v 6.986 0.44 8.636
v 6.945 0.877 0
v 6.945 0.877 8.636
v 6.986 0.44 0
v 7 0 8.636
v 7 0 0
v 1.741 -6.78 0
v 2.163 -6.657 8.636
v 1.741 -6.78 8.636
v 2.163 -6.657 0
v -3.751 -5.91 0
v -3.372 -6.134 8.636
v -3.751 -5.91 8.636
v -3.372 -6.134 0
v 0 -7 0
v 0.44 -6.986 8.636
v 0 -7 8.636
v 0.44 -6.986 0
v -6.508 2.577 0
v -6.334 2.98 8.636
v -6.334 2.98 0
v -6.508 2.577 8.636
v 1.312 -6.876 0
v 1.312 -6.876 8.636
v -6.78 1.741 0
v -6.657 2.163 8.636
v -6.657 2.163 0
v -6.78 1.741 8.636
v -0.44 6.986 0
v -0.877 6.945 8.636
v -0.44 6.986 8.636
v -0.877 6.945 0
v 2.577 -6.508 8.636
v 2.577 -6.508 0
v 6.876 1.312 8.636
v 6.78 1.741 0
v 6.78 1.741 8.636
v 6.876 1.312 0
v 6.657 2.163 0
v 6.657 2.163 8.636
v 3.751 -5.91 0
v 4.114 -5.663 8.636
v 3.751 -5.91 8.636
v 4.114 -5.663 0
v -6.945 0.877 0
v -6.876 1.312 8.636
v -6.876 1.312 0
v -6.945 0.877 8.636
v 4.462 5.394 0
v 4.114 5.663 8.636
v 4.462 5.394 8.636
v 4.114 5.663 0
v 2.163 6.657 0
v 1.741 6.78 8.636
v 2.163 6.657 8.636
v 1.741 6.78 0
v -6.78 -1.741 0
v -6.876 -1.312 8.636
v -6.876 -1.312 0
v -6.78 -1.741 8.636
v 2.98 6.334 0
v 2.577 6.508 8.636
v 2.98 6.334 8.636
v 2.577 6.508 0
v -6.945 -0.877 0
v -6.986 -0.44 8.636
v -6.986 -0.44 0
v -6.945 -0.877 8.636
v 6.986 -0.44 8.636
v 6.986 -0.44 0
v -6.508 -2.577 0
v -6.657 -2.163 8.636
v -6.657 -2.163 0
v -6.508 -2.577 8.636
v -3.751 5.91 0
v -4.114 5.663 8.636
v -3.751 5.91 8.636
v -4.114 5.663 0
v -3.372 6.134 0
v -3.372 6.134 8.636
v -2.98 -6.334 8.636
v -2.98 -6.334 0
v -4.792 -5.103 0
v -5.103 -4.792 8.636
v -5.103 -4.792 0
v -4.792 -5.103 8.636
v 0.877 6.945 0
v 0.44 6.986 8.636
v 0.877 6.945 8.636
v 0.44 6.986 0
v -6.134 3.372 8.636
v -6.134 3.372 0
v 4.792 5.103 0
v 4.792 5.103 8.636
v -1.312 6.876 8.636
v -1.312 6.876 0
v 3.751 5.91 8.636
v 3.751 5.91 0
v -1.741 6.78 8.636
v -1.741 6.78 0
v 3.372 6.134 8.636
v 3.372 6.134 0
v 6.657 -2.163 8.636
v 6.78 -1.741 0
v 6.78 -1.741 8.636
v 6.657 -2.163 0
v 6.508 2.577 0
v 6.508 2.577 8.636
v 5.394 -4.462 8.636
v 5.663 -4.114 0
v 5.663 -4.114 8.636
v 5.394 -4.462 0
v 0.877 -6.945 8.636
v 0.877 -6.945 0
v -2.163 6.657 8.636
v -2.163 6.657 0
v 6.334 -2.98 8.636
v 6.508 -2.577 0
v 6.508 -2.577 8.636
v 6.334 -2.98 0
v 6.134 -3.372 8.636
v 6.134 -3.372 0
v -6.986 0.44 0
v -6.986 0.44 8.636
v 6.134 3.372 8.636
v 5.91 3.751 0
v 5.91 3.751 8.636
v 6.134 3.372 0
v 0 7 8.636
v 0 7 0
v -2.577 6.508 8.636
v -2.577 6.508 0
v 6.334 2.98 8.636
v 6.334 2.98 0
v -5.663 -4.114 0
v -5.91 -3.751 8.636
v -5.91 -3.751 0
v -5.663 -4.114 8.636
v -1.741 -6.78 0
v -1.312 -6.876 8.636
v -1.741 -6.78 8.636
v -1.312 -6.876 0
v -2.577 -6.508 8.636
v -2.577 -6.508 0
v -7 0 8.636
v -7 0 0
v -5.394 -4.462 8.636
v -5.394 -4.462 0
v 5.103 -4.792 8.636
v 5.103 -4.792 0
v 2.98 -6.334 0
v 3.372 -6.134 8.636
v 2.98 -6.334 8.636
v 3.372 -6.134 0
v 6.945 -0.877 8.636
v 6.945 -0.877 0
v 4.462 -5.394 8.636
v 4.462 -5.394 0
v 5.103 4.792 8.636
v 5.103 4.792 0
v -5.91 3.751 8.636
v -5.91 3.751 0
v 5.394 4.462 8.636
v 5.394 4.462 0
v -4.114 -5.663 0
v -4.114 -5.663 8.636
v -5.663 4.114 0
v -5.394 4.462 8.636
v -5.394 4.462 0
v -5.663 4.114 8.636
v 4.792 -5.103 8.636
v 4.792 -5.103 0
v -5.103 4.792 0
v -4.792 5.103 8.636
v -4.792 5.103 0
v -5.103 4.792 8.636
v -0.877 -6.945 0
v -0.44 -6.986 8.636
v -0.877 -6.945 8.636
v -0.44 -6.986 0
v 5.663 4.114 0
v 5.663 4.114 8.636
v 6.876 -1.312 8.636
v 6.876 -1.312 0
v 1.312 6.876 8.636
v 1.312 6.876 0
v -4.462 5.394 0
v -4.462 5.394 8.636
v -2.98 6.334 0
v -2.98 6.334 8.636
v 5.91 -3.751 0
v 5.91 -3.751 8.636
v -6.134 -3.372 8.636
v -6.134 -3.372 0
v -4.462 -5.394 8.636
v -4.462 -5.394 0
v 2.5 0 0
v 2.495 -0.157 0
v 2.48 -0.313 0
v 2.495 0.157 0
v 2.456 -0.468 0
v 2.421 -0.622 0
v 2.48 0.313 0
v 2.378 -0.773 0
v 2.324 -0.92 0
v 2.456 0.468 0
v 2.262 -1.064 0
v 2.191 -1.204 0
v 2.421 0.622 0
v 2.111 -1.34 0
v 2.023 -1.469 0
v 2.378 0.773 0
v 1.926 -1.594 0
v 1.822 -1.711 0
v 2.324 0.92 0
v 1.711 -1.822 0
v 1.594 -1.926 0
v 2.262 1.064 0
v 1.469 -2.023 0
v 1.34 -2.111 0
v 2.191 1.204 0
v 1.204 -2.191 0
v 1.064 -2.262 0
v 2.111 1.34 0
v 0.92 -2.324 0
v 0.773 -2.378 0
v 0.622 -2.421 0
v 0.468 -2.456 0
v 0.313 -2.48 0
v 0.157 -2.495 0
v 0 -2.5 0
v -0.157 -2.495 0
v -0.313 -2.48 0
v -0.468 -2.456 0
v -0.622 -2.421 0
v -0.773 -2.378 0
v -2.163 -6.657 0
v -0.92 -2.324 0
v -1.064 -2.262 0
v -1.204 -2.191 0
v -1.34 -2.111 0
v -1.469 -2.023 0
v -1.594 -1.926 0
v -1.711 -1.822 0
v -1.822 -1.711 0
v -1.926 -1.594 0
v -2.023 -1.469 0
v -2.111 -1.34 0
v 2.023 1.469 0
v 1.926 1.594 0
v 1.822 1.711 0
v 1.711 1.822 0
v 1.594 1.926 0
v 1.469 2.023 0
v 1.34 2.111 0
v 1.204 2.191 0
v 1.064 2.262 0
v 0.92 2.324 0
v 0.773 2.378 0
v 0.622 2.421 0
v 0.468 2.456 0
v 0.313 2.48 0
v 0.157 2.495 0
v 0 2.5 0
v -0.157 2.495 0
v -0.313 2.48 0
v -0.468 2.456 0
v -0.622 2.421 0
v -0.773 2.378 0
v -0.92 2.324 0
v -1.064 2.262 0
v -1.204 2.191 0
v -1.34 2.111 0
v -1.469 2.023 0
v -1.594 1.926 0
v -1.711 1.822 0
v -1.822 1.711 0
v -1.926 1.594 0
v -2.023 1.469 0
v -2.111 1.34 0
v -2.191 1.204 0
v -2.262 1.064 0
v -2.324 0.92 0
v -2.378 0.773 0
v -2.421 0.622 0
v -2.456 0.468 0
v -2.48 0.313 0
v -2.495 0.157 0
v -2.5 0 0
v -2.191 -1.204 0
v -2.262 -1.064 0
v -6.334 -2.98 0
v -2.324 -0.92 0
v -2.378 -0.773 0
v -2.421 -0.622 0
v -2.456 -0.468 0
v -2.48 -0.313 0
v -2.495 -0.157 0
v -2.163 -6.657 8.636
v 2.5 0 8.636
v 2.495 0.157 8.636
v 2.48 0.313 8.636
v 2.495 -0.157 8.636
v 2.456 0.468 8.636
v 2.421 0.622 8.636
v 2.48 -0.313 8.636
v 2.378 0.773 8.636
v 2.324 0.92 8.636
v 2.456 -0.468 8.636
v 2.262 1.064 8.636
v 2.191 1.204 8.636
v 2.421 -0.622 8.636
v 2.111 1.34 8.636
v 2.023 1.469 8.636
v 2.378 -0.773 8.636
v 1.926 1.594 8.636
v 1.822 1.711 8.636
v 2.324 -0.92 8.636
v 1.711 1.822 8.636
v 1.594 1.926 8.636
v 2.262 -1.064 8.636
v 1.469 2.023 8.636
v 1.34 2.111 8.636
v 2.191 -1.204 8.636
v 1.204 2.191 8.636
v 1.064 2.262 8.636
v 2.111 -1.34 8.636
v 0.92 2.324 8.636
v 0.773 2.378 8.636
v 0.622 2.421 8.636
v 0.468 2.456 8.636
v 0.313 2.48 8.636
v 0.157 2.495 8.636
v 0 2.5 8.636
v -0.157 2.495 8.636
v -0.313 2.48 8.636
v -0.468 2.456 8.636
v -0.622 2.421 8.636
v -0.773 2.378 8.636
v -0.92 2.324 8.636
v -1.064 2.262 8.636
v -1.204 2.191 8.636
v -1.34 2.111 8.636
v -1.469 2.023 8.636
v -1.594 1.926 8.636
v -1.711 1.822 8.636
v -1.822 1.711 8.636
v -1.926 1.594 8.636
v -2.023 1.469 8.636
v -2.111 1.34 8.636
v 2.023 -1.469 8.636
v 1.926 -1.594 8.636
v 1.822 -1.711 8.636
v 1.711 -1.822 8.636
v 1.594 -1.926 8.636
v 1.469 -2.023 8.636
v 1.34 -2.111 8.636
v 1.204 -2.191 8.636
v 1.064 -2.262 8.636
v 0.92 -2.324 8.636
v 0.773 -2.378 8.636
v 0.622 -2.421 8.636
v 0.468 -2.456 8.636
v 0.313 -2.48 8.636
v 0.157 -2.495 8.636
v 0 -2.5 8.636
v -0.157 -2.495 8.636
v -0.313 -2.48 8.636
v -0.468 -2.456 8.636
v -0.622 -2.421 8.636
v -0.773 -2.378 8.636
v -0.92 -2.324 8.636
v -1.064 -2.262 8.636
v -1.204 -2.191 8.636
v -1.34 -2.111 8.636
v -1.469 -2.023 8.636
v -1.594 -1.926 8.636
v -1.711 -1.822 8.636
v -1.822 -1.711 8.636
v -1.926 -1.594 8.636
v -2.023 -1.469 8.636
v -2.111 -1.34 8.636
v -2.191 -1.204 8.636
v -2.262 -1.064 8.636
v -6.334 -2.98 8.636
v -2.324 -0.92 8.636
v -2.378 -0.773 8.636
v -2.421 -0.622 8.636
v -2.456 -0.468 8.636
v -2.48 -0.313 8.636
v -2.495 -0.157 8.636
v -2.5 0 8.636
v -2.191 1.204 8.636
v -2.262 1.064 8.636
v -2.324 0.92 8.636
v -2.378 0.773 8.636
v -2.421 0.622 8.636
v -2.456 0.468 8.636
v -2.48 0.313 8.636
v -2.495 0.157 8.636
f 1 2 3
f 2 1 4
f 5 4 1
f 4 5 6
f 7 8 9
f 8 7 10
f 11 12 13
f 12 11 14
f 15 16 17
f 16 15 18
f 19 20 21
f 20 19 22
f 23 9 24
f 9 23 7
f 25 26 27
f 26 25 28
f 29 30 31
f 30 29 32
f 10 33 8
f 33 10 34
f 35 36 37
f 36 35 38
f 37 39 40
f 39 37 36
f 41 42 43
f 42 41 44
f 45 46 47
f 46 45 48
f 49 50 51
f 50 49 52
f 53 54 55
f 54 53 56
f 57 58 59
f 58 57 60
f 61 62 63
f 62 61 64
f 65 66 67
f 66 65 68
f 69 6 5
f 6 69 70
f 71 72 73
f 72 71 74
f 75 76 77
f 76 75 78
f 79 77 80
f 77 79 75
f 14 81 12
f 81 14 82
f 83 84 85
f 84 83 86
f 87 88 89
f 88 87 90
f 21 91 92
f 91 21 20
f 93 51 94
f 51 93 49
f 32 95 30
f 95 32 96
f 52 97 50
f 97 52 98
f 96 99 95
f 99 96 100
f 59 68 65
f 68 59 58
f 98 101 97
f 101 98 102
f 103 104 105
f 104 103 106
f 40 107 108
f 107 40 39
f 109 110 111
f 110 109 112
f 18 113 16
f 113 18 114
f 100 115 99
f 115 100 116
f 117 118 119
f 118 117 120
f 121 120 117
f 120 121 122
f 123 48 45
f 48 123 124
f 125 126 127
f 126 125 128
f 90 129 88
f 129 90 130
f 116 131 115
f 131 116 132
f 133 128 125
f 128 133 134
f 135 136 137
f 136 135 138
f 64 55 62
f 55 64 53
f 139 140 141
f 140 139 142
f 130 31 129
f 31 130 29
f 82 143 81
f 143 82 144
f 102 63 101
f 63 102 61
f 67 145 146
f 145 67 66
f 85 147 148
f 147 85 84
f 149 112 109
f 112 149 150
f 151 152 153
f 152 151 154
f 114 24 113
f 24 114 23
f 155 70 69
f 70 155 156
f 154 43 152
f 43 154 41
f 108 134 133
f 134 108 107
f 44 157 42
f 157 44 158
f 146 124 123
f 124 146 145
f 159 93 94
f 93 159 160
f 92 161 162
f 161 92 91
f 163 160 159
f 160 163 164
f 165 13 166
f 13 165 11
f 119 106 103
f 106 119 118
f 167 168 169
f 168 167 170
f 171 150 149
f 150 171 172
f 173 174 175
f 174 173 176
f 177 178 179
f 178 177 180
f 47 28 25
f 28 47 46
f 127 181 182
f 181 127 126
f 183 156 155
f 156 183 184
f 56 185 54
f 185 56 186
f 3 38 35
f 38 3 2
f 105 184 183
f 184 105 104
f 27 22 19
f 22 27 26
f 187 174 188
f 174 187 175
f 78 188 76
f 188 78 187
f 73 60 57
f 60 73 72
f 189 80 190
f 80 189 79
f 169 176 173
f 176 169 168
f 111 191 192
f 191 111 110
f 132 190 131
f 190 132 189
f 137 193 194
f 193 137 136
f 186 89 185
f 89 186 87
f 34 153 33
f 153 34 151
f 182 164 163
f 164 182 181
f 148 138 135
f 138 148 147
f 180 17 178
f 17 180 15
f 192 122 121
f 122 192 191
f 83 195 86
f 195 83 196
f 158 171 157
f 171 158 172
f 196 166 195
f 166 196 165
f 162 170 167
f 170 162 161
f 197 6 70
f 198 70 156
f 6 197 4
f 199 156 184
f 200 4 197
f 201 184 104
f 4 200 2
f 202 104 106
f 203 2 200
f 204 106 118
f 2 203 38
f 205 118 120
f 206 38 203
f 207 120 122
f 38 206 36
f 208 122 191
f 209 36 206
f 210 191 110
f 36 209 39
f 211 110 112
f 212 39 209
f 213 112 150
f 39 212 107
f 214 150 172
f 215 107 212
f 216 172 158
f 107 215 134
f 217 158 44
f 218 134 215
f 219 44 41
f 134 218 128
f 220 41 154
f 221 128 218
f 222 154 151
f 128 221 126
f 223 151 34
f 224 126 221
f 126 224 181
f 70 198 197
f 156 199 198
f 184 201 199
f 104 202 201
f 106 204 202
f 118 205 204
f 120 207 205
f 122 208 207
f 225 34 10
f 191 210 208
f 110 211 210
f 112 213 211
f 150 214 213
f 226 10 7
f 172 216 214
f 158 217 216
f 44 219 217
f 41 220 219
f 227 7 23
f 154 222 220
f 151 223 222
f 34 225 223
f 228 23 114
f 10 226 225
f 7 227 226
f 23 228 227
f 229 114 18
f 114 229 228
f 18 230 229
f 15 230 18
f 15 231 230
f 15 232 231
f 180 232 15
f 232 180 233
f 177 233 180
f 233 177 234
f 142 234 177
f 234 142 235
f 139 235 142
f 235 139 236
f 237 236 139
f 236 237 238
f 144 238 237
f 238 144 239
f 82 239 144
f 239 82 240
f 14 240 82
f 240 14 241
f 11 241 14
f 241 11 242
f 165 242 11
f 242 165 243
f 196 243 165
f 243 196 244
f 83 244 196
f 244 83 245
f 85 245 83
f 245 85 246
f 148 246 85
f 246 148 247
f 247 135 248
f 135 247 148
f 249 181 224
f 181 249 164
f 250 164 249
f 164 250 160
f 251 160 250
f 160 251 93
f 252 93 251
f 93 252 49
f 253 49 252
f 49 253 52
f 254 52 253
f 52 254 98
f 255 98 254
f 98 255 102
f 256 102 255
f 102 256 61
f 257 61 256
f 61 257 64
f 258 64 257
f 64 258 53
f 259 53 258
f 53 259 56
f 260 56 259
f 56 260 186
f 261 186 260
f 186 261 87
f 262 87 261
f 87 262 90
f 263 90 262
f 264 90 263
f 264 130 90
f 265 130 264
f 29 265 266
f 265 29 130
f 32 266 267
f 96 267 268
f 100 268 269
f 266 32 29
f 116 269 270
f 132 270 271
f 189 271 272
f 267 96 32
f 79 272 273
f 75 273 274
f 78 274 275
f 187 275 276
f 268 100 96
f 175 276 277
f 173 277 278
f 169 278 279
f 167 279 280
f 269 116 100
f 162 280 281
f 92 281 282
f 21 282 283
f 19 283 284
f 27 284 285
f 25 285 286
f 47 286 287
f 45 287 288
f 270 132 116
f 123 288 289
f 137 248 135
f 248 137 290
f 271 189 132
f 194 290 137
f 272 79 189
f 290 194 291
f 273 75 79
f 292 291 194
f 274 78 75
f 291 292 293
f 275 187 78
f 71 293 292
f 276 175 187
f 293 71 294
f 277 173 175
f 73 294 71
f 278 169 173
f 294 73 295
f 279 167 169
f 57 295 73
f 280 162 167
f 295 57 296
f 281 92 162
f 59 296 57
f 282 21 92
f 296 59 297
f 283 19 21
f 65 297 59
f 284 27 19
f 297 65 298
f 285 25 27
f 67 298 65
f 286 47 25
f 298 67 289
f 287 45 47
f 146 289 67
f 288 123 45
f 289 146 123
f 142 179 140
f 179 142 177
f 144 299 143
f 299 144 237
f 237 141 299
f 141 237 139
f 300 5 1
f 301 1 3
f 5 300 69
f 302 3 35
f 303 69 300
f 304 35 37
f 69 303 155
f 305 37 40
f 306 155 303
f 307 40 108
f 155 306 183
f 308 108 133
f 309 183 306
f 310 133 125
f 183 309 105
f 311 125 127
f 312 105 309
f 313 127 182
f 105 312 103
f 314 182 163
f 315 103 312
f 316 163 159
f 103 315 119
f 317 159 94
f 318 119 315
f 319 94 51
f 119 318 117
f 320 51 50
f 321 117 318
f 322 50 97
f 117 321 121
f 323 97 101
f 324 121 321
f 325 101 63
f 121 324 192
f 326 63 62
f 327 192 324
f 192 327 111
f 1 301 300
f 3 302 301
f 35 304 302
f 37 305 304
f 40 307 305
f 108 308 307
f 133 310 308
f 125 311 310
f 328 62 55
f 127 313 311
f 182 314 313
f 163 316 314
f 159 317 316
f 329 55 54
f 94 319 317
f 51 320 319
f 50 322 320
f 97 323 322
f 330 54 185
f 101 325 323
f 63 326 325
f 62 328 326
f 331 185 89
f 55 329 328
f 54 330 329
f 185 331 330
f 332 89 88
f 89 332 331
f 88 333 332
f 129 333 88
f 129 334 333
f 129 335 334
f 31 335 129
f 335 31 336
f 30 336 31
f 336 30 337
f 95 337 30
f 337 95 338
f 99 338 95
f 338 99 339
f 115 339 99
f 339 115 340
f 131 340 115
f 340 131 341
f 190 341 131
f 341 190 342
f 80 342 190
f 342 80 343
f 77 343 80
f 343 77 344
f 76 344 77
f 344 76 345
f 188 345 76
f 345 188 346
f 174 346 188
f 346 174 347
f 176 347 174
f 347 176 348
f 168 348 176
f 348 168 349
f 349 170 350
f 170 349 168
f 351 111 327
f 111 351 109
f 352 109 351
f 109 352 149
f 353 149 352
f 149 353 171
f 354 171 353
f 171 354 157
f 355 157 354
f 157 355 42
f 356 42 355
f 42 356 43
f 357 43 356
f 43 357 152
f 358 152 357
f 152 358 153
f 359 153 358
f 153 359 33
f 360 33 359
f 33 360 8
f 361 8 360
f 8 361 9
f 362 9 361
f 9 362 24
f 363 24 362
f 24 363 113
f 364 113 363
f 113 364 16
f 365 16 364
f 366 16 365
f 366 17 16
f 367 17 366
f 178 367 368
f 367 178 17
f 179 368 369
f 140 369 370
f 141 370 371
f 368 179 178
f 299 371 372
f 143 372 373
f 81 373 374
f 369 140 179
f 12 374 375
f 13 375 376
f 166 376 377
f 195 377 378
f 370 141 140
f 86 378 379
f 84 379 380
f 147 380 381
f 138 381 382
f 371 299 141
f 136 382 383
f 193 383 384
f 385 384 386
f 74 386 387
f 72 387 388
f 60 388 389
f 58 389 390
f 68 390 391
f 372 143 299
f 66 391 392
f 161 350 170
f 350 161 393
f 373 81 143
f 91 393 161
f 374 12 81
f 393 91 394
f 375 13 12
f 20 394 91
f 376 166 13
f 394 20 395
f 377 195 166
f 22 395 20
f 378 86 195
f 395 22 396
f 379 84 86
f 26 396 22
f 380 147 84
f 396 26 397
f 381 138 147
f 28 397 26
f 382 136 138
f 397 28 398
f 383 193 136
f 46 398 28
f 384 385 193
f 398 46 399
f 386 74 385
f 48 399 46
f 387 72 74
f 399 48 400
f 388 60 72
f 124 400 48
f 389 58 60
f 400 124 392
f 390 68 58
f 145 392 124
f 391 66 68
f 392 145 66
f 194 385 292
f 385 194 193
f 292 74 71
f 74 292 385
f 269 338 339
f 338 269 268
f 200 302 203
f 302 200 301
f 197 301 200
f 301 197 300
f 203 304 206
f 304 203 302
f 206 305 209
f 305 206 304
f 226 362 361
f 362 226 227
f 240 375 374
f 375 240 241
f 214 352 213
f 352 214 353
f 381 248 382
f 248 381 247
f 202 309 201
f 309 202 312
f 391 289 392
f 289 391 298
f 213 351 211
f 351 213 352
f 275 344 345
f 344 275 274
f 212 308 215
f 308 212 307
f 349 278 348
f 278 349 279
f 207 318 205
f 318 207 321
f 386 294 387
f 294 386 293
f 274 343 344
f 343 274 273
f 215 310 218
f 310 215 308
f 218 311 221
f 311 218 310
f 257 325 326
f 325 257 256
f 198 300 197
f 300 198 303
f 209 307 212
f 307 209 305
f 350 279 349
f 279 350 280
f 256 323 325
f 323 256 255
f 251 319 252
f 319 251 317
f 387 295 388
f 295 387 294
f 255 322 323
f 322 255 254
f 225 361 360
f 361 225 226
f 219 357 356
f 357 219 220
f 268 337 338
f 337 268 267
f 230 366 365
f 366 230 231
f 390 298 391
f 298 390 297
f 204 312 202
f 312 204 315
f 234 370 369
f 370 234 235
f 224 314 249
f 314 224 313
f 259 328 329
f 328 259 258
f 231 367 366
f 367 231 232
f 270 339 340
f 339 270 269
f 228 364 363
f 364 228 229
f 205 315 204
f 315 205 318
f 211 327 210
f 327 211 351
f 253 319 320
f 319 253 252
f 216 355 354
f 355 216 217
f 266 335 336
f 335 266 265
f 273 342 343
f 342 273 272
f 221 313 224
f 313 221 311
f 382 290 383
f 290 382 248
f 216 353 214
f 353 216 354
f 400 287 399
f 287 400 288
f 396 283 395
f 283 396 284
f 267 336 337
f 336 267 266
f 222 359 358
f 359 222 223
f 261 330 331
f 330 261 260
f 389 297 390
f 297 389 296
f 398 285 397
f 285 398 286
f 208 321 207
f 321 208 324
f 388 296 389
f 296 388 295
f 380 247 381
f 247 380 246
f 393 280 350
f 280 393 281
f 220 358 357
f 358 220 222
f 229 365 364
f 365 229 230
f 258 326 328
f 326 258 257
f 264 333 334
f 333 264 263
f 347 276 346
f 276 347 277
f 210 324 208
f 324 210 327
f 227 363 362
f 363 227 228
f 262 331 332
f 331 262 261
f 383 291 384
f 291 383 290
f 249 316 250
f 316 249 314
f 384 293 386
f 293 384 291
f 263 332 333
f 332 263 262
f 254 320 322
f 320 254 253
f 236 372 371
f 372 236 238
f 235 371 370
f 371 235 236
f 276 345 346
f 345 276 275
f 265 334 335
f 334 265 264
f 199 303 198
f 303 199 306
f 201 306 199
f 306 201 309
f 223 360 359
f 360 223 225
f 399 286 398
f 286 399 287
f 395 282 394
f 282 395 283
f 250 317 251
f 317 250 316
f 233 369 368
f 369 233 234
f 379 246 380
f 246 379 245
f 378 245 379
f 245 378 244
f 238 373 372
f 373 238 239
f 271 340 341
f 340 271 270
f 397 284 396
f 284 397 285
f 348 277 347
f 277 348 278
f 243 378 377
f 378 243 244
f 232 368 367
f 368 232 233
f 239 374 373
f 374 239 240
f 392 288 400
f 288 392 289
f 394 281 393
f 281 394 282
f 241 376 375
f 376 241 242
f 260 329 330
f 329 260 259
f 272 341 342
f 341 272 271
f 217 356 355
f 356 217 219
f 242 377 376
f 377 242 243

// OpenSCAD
// washer

// for scanner main rotating hoop
//rout = 15.0/2;
//rin = 10.5/2;
//height = 2.0;

// for power supply spacer washers
rout = 14.0/2;
rin = 5.0/2;
height = 0.34*25.4;


$fn=100;
difference()
{
	cylinder(h=height,r=rout);
	#translate([0,0,-height/2]) cylinder(h=2*height,r=rin);
}
